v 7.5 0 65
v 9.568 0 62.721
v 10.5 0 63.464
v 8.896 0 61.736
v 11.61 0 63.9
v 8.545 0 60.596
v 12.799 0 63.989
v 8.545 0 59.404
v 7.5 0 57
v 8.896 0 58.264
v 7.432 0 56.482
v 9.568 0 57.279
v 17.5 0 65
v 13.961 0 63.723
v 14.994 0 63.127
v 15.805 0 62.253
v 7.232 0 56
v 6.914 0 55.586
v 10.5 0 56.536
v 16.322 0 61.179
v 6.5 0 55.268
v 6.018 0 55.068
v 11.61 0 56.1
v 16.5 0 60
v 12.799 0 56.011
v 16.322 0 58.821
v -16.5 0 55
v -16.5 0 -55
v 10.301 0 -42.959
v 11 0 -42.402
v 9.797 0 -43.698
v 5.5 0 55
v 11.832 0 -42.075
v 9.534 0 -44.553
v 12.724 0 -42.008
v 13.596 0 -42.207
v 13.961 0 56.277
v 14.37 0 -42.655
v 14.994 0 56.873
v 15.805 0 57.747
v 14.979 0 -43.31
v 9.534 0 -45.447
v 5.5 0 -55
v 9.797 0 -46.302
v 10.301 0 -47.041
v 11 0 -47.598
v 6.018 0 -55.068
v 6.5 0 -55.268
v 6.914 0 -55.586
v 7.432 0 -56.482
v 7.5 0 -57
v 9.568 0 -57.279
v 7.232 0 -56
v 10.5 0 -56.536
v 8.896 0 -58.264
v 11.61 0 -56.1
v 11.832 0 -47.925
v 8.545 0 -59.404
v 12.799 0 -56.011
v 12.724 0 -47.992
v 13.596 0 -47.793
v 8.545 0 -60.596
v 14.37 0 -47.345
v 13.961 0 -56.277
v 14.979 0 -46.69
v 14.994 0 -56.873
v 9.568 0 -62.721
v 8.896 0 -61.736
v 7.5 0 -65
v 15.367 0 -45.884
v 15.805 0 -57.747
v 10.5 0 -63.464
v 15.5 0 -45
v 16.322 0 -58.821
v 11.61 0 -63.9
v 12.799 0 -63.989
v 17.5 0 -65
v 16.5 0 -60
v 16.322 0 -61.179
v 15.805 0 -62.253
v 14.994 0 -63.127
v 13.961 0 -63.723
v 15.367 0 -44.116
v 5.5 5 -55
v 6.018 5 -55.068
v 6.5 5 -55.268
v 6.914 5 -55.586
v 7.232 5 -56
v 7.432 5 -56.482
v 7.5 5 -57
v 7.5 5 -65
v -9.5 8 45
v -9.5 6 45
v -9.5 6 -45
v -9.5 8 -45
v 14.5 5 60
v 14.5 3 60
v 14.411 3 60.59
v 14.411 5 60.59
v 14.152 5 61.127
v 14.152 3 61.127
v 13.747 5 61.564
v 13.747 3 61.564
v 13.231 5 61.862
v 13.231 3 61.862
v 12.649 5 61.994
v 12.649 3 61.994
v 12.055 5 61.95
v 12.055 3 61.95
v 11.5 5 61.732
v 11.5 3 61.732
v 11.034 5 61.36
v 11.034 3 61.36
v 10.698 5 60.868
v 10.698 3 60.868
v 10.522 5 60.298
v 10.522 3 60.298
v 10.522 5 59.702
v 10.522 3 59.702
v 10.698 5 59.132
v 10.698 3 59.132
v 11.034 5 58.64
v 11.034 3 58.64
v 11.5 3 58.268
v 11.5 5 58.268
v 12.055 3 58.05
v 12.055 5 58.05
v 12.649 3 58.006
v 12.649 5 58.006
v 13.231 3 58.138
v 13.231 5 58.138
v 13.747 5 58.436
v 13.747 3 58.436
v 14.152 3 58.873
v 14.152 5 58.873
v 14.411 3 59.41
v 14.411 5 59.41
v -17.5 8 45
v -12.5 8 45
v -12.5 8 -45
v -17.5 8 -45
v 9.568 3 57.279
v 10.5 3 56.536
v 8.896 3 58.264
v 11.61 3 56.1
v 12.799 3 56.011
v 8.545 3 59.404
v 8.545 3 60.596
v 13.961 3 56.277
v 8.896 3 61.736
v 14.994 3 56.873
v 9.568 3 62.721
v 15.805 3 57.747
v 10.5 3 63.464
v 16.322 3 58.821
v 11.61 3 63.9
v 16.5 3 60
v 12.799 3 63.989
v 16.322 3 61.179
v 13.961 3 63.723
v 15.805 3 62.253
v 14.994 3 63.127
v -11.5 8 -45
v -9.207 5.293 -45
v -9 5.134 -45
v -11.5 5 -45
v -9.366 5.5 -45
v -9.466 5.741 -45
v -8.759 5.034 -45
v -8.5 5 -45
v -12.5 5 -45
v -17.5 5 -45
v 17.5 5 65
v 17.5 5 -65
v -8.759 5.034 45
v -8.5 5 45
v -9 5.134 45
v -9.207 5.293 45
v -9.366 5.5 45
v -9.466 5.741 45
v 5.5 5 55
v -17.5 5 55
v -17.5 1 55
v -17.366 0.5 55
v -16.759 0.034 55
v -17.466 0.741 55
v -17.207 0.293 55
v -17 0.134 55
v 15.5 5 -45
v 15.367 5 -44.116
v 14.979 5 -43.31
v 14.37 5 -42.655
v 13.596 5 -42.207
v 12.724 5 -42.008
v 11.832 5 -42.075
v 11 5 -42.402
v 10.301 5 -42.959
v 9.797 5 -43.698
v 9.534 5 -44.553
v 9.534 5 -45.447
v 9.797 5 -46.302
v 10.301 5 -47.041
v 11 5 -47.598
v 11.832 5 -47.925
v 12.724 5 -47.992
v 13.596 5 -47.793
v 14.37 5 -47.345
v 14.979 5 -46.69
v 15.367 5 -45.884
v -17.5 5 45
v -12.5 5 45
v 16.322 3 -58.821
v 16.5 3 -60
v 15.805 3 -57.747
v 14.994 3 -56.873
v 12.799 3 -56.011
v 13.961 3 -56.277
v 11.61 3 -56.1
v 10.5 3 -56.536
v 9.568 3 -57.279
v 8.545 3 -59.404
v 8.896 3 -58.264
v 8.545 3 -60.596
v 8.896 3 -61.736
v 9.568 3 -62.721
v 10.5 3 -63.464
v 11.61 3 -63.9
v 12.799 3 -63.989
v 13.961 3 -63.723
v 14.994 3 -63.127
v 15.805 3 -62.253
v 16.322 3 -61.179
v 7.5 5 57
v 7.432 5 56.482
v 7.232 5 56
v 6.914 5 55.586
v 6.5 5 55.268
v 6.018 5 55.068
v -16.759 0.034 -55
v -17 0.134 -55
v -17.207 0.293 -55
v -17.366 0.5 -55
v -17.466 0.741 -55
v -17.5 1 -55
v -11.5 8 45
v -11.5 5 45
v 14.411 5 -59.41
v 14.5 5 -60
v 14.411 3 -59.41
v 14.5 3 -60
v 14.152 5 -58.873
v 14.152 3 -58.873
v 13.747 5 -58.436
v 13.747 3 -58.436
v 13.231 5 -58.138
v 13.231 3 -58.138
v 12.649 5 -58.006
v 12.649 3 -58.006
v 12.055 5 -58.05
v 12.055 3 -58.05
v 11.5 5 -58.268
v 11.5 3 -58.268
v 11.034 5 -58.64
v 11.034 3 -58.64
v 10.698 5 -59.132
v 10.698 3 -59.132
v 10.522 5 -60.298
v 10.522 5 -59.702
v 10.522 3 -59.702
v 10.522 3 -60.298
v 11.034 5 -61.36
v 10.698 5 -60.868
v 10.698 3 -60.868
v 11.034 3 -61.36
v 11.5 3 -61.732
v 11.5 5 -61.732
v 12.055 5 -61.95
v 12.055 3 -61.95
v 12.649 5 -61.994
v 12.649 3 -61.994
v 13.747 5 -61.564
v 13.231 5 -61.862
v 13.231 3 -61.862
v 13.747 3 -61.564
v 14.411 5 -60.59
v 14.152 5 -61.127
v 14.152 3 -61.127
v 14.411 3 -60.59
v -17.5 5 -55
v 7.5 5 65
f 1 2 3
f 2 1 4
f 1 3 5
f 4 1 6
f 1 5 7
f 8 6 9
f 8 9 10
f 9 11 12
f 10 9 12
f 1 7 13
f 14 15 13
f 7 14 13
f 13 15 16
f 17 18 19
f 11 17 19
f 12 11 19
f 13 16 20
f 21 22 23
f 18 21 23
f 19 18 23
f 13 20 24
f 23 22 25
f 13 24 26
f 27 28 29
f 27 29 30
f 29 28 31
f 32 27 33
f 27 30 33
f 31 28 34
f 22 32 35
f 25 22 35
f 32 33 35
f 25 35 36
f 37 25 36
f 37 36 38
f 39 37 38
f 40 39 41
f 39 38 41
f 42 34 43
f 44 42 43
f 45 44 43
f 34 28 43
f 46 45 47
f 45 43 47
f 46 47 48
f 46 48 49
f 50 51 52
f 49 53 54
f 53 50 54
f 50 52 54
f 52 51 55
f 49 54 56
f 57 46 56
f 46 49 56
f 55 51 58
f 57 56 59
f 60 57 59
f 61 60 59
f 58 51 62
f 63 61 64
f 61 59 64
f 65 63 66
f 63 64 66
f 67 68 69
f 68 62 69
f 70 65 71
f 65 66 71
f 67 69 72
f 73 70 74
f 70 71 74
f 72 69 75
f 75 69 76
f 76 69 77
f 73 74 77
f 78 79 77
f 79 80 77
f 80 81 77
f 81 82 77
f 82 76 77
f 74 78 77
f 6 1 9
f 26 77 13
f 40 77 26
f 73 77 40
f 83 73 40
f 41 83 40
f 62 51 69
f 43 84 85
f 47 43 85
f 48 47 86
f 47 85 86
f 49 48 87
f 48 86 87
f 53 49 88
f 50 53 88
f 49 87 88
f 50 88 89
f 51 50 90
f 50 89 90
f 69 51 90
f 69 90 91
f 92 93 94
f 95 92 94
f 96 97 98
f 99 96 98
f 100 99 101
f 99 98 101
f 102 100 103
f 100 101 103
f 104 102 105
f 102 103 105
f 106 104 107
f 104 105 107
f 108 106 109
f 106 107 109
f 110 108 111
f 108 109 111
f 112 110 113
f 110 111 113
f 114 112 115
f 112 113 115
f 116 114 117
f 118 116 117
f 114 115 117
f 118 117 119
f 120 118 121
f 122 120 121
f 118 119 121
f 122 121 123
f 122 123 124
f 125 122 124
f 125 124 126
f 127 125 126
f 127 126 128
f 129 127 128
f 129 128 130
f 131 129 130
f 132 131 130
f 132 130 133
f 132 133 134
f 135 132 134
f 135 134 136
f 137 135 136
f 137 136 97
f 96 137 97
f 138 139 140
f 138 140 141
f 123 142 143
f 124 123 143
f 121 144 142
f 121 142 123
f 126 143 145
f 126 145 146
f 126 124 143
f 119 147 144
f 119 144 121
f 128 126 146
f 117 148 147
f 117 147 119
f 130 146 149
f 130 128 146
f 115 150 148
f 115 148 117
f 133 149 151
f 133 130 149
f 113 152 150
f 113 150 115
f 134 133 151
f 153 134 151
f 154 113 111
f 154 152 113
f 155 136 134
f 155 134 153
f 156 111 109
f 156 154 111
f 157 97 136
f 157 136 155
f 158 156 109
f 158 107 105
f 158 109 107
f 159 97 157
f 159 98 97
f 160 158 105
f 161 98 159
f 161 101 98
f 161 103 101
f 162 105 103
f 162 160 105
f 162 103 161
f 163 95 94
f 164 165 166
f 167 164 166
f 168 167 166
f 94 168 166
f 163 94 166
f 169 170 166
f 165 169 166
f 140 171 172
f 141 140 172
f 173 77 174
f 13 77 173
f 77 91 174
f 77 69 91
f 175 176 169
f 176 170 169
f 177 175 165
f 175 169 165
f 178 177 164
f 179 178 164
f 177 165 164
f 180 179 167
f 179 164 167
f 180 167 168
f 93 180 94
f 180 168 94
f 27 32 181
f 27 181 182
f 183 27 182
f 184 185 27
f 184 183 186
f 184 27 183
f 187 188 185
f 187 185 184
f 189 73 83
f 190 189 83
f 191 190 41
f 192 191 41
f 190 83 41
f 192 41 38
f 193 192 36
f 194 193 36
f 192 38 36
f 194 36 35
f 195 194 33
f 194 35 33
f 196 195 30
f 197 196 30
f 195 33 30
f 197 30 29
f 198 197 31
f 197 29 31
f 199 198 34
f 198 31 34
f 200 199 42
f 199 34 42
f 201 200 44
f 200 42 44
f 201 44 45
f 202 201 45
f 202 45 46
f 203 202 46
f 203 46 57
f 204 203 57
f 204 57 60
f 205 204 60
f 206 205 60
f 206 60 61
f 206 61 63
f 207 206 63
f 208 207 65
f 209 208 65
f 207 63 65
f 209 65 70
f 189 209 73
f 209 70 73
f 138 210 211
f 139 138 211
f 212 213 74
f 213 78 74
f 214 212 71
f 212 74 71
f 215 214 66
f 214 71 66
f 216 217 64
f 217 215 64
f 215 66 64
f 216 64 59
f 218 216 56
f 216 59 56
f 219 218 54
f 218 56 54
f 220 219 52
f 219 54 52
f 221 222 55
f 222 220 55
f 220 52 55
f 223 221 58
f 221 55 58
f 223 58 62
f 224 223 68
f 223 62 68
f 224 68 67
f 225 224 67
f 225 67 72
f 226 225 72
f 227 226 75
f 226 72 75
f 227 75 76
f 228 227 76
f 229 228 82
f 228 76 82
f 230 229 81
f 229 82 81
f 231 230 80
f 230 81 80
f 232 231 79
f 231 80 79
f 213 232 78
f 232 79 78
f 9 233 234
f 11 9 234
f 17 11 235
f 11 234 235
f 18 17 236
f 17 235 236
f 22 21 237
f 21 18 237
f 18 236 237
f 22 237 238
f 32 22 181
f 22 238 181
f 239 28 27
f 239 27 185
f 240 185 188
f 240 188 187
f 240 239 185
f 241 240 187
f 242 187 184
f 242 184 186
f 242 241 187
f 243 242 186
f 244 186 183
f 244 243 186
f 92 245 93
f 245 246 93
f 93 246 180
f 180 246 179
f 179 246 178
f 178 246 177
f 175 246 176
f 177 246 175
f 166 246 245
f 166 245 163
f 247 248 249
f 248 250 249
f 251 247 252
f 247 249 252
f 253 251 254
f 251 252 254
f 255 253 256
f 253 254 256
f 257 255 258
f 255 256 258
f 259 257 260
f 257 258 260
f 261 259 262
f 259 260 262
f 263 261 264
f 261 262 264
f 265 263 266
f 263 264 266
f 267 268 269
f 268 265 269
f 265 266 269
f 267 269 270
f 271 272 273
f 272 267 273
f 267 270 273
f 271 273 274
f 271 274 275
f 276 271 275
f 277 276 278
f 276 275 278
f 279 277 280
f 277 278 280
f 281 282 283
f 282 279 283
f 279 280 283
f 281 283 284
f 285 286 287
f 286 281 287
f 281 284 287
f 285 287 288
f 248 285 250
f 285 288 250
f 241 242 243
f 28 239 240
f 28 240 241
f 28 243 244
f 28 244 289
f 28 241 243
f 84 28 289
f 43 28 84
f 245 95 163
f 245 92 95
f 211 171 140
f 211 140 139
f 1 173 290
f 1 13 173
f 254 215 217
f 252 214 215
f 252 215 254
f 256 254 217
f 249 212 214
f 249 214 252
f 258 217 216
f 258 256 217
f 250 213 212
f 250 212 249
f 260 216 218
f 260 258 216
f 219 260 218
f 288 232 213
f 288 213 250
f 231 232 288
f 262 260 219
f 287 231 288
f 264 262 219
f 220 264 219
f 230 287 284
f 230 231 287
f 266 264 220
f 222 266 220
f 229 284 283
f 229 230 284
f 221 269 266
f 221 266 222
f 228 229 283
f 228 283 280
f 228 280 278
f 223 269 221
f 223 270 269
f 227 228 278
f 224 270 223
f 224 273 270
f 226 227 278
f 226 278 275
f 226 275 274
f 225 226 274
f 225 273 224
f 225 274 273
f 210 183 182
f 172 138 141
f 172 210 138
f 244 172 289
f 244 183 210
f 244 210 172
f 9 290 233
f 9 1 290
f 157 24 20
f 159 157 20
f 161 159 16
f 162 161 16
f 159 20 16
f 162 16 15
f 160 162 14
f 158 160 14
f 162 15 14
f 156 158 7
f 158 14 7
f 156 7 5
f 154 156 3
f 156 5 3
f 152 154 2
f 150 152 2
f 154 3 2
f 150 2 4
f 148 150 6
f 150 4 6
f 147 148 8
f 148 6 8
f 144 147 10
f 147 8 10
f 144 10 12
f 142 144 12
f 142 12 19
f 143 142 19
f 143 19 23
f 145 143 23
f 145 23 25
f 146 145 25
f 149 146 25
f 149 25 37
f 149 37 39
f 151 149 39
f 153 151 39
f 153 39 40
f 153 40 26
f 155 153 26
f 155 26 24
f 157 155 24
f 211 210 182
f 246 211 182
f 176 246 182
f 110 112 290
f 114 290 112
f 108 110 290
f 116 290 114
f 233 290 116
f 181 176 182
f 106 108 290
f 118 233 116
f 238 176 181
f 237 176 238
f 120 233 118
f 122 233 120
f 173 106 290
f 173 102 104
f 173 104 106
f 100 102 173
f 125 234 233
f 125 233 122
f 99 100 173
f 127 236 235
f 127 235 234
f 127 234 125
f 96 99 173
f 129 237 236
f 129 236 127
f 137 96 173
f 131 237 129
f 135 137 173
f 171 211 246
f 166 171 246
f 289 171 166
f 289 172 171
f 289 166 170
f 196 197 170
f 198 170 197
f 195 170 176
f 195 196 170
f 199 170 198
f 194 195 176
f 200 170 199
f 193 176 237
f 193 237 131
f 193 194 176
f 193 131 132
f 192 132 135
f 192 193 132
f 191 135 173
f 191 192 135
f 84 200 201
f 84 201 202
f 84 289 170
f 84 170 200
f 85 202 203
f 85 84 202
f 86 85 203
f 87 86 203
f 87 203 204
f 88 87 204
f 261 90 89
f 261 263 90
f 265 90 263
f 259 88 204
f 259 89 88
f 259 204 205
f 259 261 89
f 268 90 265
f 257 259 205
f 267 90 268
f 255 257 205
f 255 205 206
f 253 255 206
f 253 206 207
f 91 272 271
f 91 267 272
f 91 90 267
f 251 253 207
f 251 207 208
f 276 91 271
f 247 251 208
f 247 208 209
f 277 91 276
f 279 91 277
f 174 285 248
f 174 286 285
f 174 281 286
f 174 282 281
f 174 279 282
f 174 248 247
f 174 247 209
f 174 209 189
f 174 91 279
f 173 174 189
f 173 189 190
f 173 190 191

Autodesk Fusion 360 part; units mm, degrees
sketch "cover base" plane through (0, 0, 0) normal (0, 1, 0) x (1, 0, 0)
  line L0 (17.5, -55) -> (-17.5, -55)
  line L1 (-17.5, -55) -> (-17.5, 55)
  line L2 (-17.5, 55) -> (17.5, 55)
  line L3 (17.5, 55) -> (17.5, -55)
  line L4 (17.5, -55) -> (-17.5, 55) construction
  line L5 (-17.5, -55) -> (17.5, 55) construction
  dimension "d1" = 35
  dimension "d2" = 110
extrude "Extrude1" add sketch "cover base" along normal blind 5
sketch "Screw holder" plane through (0, 0, 0) normal (0, -1, 0) x (1, 0, 0)
  line L0 (-17.5, -55) -> (17.5, -55)
  line L1 (17.5, -55) -> (17.5, 55)
  line L2 (17.5, 55) -> (-17.5, 55)
  line L3 (-17.5, 55) -> (-17.5, -55)
  line L4 (7.5, 55) -> (17.5, 55)
  line L5 (17.5, 55) -> (17.5, 65)
  line L6 (17.5, 65) -> (7.5, 65)
  line L7 (7.5, 65) -> (7.5, 55)
  circle A0 centre (12.5, 60) radius 4
  circle A1 centre (12.5, 60) radius 2
  dimension "d5" = 10
  dimension "d6" = 10
  dimension "d9" = 8
  dimension "d10" = 4
extrude "Extrude2" add sketch "Screw holder" against normal blind 5 contours L2 L4 L5 L6 L7 | A0 | A1
extrude "Extrude3" cut sketch "Screw holder" against normal up to surface (5 mm away) contours A1
extrude "Extrude4" cut sketch "Screw holder" against normal blind 3 contours A0
mirror "Mirror1" about plane through (0, 0, 0) normal (0, 0, 1) of "Extrude2", "Extrude3", "Extrude4"
sketch "Slit" plane through (0, 5, 0) normal (0, 1, 0) x (-1, 0, 0)
  circle A0 centre (-12.5, -60) radius 2
  circle A1 centre (-12.5, 60) radius 2
  line L0 (-7.5, -55) -> (17.5, -55)
  line L1 (17.5, -55) -> (17.5, 55)
  line L2 (17.5, 55) -> (-7.5, 55)
  line L3 (-7.5, 55) -> (-7.5, 65)
  line L4 (-7.5, 65) -> (-17.5, 65)
  line L5 (-17.5, 65) -> (-17.5, -65)
  line L6 (-17.5, -65) -> (-7.5, -65)
  line L7 (-7.5, -65) -> (-7.5, -55)
  line L8 (-17.5, 55) -> (11.5, 55) construction
  line L9 (17.5, 45) -> (9.5, 45)
  line L10 (9.5, 45) -> (9.5, -45)
  line L11 (9.5, -45) -> (17.5, -45)
  line L12 (17.5, -45) -> (17.5, 45)
  line L13 (11.5, 55) -> (11.5, 45) construction
  line L14 (12.5, 45) -> (11.5, 45)
  line L15 (11.5, 45) -> (11.5, -45)
  line L16 (11.5, -45) -> (12.5, -45)
  line L17 (12.5, -45) -> (12.5, 45)
  dimension "d16" = 29
  dimension "d23" = 8
  dimension "d35" = 90
  dimension "d36" = 90
  dimension "d37" = 1
extrude "Extrude5" add sketch "Slit" along normal blind 3 contours L1 L9 L11 L12 L17 | L9 L11 L14 L15 L16 L17 | L9 L10 L11 L15
extrude "Extrude8" cut sketch "Slit" along normal blind 3 contours L9 L11 L14 L15 L16 L17
fillet "Fillet1" radius 1 1 edges at (-17.5, 0, 0)
fillet "Fillet2" radius 2 2 edges at (7.5, 2.5, -55) (7.5, 2.5, 55)
fillet "Fillet3" radius 1 1 edges at (-9.5, 5, 0)
sketch "Sketch5" plane through (0, 0, 0) normal (0, -1, 0) x (1, 0, 0)
  line L0 (-16.5, 55) -> (-16.5, -55)
  line L1 (-16.5, -55) -> (5.5, -55)
  arc A0 (7.5, -57) -> (5.5, -55) centre (5.5, -57) ccw
  line L2 (7.5, -57) -> (7.5, -65)
  line L3 (7.5, -65) -> (17.5, -65)
  line L4 (17.5, -65) -> (17.5, 65)
  line L5 (17.5, 65) -> (7.5, 65)
  line L6 (7.5, 65) -> (7.5, 57)
  arc A1 (5.5, 55) -> (7.5, 57) centre (5.5, 57) ccw
  line L7 (5.5, 55) -> (-16.5, 55)
  circle A2 centre (12.5, -60) radius 4
  circle A3 centre (12.5, 60) radius 4
  line L8 (12.5, -60) -> (12.5, -45) construction
  circle A4 centre (12.5, -45) radius 3
  dimension "d29" = 15
  dimension "d30" = 6
extrude "Extrude7" cut sketch "Sketch5" against normal up to surface (5 mm away) contours A4
